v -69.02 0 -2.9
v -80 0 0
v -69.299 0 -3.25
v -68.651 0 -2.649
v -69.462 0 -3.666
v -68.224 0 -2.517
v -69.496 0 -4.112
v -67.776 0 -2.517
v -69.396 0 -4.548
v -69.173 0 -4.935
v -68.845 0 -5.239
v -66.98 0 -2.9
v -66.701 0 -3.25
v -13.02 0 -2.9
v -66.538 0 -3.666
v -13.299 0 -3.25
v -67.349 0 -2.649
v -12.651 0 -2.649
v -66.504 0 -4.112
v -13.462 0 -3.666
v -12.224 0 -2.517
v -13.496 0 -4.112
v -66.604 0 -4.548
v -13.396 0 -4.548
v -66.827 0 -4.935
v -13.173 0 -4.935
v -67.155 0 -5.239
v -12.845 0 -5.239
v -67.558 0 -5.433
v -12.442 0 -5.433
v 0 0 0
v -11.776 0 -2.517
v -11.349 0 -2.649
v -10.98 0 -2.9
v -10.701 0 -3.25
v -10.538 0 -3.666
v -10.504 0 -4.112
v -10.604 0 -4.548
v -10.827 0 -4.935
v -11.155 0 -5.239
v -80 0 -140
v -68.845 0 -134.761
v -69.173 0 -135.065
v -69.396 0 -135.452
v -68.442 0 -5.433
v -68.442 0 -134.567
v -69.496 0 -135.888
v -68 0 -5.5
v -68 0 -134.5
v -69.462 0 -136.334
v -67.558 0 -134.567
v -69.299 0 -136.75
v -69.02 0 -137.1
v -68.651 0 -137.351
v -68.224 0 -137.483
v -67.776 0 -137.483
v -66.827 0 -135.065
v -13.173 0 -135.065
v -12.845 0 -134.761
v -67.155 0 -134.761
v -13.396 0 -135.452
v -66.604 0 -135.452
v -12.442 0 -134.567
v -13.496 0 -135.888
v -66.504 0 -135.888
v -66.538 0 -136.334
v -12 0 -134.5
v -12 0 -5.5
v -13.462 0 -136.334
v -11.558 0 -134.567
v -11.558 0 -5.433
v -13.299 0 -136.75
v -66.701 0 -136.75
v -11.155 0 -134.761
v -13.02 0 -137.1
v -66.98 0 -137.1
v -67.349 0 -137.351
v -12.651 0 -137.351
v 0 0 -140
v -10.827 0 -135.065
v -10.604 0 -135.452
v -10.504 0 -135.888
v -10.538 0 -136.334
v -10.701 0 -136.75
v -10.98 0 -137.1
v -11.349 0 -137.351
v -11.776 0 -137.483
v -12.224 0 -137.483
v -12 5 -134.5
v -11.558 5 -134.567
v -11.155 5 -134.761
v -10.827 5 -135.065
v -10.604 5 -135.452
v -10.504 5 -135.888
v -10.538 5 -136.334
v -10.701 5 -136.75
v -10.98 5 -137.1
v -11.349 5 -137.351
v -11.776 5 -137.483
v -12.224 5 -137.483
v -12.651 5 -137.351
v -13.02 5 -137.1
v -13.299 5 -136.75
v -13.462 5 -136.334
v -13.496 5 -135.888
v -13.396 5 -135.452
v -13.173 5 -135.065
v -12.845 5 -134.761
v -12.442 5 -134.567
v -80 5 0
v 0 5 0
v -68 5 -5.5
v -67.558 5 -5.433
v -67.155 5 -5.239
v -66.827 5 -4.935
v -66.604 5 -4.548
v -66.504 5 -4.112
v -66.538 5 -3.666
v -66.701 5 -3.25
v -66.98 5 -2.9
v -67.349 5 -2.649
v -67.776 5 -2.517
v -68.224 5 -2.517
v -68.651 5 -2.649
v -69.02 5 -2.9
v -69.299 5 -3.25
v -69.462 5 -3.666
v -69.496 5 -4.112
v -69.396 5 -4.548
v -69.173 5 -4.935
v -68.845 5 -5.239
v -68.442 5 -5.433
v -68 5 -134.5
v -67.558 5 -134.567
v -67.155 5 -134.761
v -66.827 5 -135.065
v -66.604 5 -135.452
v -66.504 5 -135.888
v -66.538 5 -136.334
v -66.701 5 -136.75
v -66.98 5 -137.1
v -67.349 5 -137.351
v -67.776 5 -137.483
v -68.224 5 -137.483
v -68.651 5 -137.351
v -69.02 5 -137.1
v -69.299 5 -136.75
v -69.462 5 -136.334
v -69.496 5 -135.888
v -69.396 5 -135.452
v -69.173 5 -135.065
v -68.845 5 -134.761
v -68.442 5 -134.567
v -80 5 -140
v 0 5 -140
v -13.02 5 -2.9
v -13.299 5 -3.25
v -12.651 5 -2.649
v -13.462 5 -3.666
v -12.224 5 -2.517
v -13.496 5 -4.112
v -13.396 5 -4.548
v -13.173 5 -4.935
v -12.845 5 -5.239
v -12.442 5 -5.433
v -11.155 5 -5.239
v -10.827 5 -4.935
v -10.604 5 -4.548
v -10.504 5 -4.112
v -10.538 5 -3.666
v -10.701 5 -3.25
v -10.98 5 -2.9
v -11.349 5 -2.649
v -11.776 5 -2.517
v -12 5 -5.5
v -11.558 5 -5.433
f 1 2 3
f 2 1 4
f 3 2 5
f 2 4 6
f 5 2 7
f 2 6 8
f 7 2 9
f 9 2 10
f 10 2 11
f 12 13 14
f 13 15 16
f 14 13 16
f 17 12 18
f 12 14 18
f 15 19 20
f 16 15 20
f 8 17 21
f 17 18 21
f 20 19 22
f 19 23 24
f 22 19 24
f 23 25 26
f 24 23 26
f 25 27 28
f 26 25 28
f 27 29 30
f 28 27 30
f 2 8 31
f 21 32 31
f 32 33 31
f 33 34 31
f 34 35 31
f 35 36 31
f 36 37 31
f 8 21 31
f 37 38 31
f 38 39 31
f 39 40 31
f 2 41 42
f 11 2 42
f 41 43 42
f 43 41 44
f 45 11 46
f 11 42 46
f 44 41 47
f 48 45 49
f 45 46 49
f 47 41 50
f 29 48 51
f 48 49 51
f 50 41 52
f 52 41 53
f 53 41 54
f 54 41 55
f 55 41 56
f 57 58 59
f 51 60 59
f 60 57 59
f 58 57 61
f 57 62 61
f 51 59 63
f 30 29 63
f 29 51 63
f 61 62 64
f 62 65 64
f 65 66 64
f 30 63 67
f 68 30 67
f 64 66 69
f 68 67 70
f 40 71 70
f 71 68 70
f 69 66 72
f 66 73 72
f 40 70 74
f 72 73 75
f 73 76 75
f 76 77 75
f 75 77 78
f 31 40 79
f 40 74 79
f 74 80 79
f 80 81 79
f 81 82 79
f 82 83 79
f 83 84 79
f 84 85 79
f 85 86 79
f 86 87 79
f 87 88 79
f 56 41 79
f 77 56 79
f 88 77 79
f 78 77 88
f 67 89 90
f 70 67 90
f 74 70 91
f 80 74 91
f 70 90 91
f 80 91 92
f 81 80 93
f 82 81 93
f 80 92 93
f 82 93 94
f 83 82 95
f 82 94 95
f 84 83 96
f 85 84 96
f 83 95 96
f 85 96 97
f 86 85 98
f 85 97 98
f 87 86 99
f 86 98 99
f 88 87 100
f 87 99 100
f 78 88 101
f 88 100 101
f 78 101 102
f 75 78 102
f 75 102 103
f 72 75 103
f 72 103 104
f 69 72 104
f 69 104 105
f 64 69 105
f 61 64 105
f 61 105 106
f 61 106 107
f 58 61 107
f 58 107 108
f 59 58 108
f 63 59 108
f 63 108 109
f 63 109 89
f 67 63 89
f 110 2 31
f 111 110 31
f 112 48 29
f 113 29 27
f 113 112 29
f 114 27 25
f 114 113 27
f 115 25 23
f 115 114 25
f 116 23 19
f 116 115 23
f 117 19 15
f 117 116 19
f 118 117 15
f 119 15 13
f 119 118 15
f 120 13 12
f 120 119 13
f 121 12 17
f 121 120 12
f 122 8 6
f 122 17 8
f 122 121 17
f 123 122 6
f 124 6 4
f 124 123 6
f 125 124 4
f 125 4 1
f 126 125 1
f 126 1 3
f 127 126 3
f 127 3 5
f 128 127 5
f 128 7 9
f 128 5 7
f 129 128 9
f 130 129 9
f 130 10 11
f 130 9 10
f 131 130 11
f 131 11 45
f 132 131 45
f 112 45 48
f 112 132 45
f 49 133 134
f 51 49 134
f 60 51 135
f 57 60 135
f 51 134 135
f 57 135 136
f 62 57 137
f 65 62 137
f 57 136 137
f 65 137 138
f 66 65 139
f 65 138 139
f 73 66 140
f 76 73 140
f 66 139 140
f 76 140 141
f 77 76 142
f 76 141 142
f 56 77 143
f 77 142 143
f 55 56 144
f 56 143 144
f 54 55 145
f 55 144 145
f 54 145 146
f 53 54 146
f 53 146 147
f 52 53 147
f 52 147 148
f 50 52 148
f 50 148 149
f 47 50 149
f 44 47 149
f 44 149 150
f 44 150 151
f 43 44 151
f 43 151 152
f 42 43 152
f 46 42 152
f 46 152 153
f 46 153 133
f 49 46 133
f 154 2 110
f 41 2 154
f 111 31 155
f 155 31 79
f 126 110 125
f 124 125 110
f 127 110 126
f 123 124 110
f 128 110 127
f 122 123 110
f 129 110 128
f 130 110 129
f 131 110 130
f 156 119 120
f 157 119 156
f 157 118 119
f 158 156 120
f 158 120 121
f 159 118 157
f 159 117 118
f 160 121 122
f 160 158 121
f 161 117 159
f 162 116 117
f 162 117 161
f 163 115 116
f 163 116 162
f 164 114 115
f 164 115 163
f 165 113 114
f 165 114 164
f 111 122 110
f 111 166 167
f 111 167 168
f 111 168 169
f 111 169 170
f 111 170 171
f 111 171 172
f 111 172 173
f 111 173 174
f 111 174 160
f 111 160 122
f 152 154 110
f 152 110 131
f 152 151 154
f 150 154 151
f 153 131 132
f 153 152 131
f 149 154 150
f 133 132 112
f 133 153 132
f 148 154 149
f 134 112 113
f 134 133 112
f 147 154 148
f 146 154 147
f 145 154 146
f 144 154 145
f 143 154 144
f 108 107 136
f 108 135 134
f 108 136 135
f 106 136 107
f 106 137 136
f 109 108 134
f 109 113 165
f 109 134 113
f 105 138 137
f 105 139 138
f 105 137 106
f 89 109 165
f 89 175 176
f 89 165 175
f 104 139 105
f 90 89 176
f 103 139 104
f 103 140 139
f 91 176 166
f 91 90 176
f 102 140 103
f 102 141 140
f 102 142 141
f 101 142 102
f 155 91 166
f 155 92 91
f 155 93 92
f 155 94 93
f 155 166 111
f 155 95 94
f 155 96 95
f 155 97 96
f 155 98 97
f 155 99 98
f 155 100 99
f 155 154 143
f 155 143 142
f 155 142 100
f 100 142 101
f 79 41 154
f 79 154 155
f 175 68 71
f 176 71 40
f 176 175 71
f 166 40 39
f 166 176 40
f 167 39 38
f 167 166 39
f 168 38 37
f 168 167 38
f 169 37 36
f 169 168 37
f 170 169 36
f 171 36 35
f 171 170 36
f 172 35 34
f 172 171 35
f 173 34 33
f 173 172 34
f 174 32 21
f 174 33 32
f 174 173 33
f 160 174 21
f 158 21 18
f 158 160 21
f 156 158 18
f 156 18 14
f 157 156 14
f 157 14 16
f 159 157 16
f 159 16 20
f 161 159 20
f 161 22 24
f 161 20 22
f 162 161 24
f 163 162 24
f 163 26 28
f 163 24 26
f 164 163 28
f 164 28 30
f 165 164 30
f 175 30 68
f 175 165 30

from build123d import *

# Parameters (mm, degrees)
SKETCH1_W           = 80
SKETCH1_H           = 140
BOSS_EXTRUDE1_DEPTH = 5
SKETCH2_R           = 1.5
CUT_EXTRUDE1_DEPTH  = 162.322658049
SKETCH3_R           = 1.5
CUT_EXTRUDE2_DEPTH  = 162.322658049


with BuildPart() as part:
    # Sketch1 → Boss-Extrude1 (new body)
    with BuildSketch(Plane(origin=(0, 0, 0), x_dir=(1, 0, 0), z_dir=(0, 1, 0))):
        with Locations((-40, 70)):
            Rectangle(SKETCH1_W, SKETCH1_H)
    extrude(amount=BOSS_EXTRUDE1_DEPTH)

    # Sketch2 → Cut-Extrude1 (cut, through all)
    with BuildSketch(Plane(origin=(0, 5, 0), x_dir=(1, 0, 0), z_dir=(0, 1, 0))):
        with Locations(Location((-68, 136, 0), (0, 0, 270))):
            Circle(SKETCH2_R)
    cut_extrude1 = extrude(amount=-CUT_EXTRUDE1_DEPTH, mode=Mode.SUBTRACT)

    # Sketch3 → Cut-Extrude2 (cut, through all)
    with BuildSketch(Plane(origin=(0, 5, 0), x_dir=(1, 0, 0), z_dir=(0, 1, 0))):
        with Locations(Location((-12, 136, 0), (0, 0, 270))):
            Circle(SKETCH3_R)
    cut_extrude2 = extrude(amount=-CUT_EXTRUDE2_DEPTH, mode=Mode.SUBTRACT)

    # Mirror1: Cut-Extrude1, Cut-Extrude2 across plane
    add(cut_extrude1.mirror(Plane.XY.offset(-70)), mode=Mode.SUBTRACT)
    add(cut_extrude2.mirror(Plane.XY.offset(-70)), mode=Mode.SUBTRACT)


solid = part.part
